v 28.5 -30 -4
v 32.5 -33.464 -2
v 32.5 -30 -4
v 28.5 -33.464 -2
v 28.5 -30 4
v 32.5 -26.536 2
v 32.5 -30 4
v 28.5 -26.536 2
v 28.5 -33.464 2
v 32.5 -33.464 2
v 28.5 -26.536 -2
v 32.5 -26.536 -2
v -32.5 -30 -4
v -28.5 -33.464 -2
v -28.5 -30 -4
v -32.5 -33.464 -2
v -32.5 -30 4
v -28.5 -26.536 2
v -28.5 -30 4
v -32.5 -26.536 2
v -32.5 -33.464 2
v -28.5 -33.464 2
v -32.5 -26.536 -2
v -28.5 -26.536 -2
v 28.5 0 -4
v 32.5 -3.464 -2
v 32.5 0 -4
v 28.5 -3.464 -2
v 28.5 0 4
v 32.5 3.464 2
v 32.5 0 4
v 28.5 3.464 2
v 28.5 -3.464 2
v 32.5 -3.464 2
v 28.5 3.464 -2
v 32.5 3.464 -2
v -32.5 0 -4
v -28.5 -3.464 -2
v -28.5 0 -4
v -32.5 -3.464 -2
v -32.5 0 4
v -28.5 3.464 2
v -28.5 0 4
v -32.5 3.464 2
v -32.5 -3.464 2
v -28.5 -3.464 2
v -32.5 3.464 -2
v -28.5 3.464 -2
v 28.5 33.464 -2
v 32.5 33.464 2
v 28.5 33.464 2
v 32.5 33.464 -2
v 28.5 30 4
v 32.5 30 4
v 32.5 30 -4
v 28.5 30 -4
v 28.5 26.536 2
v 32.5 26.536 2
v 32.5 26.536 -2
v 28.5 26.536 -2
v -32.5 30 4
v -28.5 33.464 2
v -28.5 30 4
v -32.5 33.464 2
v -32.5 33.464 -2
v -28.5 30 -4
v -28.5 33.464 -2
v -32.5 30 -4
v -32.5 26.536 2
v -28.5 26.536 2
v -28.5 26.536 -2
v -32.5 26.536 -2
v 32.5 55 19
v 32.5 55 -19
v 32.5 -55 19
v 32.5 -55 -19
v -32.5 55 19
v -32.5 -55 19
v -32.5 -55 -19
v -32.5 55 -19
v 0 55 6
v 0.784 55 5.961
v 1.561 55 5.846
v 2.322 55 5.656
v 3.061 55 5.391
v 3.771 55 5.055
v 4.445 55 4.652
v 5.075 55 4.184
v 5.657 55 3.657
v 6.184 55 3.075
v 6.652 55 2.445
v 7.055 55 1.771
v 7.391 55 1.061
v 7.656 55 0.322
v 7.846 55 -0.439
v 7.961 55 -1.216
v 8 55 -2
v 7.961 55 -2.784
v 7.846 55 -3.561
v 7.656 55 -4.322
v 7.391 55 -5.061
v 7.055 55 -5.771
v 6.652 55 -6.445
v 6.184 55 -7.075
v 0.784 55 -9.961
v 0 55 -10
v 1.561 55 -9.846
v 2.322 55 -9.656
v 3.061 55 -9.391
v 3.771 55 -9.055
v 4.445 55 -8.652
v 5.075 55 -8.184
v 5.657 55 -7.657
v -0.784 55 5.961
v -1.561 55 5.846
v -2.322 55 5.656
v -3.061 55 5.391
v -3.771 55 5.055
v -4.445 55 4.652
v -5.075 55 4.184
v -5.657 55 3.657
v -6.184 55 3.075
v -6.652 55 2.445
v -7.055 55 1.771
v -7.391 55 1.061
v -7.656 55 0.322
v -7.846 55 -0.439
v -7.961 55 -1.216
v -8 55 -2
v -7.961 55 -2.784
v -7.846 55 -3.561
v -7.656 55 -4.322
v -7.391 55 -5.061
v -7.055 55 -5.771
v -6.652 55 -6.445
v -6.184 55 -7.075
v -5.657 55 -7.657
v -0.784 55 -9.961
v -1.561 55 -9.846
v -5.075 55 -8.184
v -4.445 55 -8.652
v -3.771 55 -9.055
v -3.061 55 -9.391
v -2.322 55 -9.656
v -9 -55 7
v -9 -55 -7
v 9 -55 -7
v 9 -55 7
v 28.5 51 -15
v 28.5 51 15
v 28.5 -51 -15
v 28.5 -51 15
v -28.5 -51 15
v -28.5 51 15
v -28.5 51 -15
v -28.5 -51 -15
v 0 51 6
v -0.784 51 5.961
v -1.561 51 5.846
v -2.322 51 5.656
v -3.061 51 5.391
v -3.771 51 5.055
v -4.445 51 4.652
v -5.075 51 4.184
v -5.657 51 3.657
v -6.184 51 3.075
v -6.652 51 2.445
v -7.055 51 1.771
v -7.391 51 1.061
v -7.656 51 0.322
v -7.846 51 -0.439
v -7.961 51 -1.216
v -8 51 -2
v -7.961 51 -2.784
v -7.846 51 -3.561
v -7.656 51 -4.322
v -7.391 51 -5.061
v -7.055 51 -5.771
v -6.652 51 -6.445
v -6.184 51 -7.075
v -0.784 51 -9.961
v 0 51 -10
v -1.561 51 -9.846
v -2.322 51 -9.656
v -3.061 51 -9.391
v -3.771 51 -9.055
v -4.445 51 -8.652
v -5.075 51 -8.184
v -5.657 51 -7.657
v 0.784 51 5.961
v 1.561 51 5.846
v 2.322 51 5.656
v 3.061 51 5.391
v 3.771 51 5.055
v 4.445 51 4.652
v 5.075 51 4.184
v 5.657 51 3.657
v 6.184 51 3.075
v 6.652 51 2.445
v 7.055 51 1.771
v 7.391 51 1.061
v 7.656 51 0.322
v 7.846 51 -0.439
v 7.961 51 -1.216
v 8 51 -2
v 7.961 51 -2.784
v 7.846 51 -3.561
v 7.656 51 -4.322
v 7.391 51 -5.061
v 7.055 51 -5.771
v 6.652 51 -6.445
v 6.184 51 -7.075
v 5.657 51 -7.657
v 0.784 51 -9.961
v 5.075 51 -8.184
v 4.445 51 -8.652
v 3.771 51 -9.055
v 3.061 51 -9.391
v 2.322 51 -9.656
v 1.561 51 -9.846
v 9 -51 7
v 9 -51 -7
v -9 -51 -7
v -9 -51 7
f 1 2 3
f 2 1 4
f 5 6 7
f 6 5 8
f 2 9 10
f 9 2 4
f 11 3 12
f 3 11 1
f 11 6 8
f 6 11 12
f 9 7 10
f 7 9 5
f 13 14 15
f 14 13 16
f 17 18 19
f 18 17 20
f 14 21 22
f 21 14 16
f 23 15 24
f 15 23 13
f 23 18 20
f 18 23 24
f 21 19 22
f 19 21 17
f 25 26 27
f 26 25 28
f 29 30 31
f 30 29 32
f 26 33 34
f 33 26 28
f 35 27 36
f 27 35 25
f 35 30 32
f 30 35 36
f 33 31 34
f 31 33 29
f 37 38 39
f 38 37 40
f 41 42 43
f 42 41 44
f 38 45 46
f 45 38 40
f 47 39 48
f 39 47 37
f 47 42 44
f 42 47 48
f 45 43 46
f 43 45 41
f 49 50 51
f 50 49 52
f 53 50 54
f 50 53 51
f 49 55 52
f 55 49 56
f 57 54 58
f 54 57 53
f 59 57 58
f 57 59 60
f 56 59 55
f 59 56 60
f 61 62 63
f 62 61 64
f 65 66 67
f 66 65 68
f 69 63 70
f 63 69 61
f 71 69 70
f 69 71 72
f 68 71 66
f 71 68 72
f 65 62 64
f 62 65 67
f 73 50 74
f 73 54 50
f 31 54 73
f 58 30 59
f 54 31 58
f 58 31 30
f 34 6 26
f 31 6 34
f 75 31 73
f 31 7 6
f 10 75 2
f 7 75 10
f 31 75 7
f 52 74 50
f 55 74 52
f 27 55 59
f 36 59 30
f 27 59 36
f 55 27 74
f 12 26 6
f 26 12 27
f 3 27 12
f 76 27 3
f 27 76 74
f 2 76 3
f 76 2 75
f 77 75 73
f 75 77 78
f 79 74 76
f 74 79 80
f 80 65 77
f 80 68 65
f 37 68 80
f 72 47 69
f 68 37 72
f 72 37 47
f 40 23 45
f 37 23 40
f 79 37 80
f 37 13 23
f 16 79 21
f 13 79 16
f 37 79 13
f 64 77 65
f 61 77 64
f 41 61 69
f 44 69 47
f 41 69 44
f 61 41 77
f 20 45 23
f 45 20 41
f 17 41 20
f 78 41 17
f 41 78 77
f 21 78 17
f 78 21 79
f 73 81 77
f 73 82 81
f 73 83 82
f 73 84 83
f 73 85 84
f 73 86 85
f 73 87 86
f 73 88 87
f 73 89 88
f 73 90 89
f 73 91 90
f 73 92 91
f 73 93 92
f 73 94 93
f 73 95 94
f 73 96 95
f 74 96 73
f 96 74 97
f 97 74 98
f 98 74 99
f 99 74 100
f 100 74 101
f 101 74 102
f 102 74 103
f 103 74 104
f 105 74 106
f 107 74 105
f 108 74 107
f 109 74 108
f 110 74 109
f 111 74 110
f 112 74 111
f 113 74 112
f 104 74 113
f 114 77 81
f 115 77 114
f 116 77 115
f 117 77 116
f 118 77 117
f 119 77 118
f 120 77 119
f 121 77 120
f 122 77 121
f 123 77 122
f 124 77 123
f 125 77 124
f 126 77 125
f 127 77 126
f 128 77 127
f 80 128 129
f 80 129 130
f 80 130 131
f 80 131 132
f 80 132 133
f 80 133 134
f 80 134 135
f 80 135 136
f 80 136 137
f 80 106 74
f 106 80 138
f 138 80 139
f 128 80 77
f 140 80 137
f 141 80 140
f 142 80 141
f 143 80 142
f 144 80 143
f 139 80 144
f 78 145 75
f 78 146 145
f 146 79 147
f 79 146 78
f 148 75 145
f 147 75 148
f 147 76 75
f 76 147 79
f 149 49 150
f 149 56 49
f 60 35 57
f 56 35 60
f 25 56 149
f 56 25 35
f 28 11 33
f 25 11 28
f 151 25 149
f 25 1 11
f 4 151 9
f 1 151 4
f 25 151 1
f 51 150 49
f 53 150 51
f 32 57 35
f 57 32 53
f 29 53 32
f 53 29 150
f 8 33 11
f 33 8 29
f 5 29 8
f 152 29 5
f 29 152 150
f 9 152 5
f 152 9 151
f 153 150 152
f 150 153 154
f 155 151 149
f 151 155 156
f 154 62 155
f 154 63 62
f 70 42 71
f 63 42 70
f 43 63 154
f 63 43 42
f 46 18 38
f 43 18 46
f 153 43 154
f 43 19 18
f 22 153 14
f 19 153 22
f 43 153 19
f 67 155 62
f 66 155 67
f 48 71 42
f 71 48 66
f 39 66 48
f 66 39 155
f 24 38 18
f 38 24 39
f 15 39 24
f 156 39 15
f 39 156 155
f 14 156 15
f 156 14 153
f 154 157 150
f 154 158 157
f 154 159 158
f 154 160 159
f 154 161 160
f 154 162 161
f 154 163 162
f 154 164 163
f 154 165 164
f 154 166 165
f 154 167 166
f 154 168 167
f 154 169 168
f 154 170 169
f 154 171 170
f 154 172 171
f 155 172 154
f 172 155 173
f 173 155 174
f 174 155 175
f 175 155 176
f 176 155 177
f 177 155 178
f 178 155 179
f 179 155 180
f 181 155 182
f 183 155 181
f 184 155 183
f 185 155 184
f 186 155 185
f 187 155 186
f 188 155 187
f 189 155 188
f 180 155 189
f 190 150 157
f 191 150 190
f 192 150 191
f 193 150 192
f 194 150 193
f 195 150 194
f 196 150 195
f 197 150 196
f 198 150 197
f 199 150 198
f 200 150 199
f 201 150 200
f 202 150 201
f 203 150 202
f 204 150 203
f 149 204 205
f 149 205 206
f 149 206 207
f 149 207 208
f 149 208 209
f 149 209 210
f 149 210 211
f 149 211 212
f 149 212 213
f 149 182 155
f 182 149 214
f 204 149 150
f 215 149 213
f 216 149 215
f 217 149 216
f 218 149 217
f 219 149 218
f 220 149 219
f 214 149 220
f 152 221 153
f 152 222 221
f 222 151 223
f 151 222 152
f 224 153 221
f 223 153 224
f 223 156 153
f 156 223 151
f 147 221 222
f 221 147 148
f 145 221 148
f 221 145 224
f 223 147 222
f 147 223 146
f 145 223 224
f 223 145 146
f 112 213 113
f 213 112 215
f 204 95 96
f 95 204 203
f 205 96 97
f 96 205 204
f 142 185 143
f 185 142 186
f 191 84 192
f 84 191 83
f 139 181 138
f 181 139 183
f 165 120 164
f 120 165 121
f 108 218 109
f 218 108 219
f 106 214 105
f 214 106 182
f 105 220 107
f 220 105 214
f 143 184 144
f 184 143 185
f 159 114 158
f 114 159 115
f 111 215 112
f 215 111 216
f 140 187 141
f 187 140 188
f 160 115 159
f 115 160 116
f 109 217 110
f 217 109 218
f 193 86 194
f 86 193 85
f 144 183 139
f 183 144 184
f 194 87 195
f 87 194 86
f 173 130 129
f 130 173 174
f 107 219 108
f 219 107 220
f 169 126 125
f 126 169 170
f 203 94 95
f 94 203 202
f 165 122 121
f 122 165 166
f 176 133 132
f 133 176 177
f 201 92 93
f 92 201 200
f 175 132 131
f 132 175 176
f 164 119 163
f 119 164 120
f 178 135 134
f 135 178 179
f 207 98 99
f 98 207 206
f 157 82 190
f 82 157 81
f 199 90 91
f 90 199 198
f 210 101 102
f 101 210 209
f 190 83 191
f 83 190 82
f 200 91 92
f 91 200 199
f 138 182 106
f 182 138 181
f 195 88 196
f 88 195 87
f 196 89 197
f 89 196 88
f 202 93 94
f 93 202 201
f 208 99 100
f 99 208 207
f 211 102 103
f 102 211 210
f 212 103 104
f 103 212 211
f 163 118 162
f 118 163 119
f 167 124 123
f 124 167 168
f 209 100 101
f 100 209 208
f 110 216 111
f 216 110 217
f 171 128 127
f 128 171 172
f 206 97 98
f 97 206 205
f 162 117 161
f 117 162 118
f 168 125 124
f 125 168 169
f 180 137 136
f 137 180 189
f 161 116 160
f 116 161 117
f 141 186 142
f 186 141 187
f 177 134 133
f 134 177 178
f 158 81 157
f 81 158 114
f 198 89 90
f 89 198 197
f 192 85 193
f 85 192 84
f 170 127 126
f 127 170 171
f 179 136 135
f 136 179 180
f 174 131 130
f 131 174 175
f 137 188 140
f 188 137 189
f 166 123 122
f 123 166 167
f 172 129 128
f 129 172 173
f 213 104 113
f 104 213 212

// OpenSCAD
/**
 * ==============================================================================
 * UNIVAC IX / GUNDAM ROBOTICS SYSTEMS ENCLOSURE UPGRADE
 * Asset Target Reference Configuration: M1151 HMMWV Node #8120
 * Description: Ultra-compact, heavy-duty SWATMOD Jump Pack charger chassis.
 * ==============================================================================
 */

// Global Render Resolution Profiles
$fn = 64;

// Primary Execution Assembly Target
render_swatmod_chassis();

module render_swatmod_chassis() {
    color([0.15, 0.15, 0.16, 1.0]) {
        difference() {
            // Main solid high-impact shielding chassis body envelope blocks
            cube([65, 110, 38], center=true);
            
            // Core inner clearance pocket cavity for the 8-layer charge controller PCB
            cube([57, 102, 30], center=true);
            
            // Inbound port cut for the heavy-duty high-amp 24V input power lines
            translate([0, -55, 0])
                cube([18, 12, 14], center=true);
                
            // Outbound port cut for the specialized small-form circular battery plug
            translate([0, 55, -2])
                rotate([90, 0, 0])
                    cylinder(h=15, r=8, center=true);
                    
            // Hexagonal recess side cuts for active thermal dissipation ventilation blocks
            for (y_vent = [-30, 0, 30]) {
                translate([32.5, y_vent, 0])
                    rotate([0, 90, 0])
                        cylinder(h=10, r=4, center=true, $fn=6);
                translate([-32.5, y_vent, 0])
                    rotate([0, 90, 0])
                        cylinder(h=10, r=4, center=true, $fn=6);
            }
        }
    }
}
